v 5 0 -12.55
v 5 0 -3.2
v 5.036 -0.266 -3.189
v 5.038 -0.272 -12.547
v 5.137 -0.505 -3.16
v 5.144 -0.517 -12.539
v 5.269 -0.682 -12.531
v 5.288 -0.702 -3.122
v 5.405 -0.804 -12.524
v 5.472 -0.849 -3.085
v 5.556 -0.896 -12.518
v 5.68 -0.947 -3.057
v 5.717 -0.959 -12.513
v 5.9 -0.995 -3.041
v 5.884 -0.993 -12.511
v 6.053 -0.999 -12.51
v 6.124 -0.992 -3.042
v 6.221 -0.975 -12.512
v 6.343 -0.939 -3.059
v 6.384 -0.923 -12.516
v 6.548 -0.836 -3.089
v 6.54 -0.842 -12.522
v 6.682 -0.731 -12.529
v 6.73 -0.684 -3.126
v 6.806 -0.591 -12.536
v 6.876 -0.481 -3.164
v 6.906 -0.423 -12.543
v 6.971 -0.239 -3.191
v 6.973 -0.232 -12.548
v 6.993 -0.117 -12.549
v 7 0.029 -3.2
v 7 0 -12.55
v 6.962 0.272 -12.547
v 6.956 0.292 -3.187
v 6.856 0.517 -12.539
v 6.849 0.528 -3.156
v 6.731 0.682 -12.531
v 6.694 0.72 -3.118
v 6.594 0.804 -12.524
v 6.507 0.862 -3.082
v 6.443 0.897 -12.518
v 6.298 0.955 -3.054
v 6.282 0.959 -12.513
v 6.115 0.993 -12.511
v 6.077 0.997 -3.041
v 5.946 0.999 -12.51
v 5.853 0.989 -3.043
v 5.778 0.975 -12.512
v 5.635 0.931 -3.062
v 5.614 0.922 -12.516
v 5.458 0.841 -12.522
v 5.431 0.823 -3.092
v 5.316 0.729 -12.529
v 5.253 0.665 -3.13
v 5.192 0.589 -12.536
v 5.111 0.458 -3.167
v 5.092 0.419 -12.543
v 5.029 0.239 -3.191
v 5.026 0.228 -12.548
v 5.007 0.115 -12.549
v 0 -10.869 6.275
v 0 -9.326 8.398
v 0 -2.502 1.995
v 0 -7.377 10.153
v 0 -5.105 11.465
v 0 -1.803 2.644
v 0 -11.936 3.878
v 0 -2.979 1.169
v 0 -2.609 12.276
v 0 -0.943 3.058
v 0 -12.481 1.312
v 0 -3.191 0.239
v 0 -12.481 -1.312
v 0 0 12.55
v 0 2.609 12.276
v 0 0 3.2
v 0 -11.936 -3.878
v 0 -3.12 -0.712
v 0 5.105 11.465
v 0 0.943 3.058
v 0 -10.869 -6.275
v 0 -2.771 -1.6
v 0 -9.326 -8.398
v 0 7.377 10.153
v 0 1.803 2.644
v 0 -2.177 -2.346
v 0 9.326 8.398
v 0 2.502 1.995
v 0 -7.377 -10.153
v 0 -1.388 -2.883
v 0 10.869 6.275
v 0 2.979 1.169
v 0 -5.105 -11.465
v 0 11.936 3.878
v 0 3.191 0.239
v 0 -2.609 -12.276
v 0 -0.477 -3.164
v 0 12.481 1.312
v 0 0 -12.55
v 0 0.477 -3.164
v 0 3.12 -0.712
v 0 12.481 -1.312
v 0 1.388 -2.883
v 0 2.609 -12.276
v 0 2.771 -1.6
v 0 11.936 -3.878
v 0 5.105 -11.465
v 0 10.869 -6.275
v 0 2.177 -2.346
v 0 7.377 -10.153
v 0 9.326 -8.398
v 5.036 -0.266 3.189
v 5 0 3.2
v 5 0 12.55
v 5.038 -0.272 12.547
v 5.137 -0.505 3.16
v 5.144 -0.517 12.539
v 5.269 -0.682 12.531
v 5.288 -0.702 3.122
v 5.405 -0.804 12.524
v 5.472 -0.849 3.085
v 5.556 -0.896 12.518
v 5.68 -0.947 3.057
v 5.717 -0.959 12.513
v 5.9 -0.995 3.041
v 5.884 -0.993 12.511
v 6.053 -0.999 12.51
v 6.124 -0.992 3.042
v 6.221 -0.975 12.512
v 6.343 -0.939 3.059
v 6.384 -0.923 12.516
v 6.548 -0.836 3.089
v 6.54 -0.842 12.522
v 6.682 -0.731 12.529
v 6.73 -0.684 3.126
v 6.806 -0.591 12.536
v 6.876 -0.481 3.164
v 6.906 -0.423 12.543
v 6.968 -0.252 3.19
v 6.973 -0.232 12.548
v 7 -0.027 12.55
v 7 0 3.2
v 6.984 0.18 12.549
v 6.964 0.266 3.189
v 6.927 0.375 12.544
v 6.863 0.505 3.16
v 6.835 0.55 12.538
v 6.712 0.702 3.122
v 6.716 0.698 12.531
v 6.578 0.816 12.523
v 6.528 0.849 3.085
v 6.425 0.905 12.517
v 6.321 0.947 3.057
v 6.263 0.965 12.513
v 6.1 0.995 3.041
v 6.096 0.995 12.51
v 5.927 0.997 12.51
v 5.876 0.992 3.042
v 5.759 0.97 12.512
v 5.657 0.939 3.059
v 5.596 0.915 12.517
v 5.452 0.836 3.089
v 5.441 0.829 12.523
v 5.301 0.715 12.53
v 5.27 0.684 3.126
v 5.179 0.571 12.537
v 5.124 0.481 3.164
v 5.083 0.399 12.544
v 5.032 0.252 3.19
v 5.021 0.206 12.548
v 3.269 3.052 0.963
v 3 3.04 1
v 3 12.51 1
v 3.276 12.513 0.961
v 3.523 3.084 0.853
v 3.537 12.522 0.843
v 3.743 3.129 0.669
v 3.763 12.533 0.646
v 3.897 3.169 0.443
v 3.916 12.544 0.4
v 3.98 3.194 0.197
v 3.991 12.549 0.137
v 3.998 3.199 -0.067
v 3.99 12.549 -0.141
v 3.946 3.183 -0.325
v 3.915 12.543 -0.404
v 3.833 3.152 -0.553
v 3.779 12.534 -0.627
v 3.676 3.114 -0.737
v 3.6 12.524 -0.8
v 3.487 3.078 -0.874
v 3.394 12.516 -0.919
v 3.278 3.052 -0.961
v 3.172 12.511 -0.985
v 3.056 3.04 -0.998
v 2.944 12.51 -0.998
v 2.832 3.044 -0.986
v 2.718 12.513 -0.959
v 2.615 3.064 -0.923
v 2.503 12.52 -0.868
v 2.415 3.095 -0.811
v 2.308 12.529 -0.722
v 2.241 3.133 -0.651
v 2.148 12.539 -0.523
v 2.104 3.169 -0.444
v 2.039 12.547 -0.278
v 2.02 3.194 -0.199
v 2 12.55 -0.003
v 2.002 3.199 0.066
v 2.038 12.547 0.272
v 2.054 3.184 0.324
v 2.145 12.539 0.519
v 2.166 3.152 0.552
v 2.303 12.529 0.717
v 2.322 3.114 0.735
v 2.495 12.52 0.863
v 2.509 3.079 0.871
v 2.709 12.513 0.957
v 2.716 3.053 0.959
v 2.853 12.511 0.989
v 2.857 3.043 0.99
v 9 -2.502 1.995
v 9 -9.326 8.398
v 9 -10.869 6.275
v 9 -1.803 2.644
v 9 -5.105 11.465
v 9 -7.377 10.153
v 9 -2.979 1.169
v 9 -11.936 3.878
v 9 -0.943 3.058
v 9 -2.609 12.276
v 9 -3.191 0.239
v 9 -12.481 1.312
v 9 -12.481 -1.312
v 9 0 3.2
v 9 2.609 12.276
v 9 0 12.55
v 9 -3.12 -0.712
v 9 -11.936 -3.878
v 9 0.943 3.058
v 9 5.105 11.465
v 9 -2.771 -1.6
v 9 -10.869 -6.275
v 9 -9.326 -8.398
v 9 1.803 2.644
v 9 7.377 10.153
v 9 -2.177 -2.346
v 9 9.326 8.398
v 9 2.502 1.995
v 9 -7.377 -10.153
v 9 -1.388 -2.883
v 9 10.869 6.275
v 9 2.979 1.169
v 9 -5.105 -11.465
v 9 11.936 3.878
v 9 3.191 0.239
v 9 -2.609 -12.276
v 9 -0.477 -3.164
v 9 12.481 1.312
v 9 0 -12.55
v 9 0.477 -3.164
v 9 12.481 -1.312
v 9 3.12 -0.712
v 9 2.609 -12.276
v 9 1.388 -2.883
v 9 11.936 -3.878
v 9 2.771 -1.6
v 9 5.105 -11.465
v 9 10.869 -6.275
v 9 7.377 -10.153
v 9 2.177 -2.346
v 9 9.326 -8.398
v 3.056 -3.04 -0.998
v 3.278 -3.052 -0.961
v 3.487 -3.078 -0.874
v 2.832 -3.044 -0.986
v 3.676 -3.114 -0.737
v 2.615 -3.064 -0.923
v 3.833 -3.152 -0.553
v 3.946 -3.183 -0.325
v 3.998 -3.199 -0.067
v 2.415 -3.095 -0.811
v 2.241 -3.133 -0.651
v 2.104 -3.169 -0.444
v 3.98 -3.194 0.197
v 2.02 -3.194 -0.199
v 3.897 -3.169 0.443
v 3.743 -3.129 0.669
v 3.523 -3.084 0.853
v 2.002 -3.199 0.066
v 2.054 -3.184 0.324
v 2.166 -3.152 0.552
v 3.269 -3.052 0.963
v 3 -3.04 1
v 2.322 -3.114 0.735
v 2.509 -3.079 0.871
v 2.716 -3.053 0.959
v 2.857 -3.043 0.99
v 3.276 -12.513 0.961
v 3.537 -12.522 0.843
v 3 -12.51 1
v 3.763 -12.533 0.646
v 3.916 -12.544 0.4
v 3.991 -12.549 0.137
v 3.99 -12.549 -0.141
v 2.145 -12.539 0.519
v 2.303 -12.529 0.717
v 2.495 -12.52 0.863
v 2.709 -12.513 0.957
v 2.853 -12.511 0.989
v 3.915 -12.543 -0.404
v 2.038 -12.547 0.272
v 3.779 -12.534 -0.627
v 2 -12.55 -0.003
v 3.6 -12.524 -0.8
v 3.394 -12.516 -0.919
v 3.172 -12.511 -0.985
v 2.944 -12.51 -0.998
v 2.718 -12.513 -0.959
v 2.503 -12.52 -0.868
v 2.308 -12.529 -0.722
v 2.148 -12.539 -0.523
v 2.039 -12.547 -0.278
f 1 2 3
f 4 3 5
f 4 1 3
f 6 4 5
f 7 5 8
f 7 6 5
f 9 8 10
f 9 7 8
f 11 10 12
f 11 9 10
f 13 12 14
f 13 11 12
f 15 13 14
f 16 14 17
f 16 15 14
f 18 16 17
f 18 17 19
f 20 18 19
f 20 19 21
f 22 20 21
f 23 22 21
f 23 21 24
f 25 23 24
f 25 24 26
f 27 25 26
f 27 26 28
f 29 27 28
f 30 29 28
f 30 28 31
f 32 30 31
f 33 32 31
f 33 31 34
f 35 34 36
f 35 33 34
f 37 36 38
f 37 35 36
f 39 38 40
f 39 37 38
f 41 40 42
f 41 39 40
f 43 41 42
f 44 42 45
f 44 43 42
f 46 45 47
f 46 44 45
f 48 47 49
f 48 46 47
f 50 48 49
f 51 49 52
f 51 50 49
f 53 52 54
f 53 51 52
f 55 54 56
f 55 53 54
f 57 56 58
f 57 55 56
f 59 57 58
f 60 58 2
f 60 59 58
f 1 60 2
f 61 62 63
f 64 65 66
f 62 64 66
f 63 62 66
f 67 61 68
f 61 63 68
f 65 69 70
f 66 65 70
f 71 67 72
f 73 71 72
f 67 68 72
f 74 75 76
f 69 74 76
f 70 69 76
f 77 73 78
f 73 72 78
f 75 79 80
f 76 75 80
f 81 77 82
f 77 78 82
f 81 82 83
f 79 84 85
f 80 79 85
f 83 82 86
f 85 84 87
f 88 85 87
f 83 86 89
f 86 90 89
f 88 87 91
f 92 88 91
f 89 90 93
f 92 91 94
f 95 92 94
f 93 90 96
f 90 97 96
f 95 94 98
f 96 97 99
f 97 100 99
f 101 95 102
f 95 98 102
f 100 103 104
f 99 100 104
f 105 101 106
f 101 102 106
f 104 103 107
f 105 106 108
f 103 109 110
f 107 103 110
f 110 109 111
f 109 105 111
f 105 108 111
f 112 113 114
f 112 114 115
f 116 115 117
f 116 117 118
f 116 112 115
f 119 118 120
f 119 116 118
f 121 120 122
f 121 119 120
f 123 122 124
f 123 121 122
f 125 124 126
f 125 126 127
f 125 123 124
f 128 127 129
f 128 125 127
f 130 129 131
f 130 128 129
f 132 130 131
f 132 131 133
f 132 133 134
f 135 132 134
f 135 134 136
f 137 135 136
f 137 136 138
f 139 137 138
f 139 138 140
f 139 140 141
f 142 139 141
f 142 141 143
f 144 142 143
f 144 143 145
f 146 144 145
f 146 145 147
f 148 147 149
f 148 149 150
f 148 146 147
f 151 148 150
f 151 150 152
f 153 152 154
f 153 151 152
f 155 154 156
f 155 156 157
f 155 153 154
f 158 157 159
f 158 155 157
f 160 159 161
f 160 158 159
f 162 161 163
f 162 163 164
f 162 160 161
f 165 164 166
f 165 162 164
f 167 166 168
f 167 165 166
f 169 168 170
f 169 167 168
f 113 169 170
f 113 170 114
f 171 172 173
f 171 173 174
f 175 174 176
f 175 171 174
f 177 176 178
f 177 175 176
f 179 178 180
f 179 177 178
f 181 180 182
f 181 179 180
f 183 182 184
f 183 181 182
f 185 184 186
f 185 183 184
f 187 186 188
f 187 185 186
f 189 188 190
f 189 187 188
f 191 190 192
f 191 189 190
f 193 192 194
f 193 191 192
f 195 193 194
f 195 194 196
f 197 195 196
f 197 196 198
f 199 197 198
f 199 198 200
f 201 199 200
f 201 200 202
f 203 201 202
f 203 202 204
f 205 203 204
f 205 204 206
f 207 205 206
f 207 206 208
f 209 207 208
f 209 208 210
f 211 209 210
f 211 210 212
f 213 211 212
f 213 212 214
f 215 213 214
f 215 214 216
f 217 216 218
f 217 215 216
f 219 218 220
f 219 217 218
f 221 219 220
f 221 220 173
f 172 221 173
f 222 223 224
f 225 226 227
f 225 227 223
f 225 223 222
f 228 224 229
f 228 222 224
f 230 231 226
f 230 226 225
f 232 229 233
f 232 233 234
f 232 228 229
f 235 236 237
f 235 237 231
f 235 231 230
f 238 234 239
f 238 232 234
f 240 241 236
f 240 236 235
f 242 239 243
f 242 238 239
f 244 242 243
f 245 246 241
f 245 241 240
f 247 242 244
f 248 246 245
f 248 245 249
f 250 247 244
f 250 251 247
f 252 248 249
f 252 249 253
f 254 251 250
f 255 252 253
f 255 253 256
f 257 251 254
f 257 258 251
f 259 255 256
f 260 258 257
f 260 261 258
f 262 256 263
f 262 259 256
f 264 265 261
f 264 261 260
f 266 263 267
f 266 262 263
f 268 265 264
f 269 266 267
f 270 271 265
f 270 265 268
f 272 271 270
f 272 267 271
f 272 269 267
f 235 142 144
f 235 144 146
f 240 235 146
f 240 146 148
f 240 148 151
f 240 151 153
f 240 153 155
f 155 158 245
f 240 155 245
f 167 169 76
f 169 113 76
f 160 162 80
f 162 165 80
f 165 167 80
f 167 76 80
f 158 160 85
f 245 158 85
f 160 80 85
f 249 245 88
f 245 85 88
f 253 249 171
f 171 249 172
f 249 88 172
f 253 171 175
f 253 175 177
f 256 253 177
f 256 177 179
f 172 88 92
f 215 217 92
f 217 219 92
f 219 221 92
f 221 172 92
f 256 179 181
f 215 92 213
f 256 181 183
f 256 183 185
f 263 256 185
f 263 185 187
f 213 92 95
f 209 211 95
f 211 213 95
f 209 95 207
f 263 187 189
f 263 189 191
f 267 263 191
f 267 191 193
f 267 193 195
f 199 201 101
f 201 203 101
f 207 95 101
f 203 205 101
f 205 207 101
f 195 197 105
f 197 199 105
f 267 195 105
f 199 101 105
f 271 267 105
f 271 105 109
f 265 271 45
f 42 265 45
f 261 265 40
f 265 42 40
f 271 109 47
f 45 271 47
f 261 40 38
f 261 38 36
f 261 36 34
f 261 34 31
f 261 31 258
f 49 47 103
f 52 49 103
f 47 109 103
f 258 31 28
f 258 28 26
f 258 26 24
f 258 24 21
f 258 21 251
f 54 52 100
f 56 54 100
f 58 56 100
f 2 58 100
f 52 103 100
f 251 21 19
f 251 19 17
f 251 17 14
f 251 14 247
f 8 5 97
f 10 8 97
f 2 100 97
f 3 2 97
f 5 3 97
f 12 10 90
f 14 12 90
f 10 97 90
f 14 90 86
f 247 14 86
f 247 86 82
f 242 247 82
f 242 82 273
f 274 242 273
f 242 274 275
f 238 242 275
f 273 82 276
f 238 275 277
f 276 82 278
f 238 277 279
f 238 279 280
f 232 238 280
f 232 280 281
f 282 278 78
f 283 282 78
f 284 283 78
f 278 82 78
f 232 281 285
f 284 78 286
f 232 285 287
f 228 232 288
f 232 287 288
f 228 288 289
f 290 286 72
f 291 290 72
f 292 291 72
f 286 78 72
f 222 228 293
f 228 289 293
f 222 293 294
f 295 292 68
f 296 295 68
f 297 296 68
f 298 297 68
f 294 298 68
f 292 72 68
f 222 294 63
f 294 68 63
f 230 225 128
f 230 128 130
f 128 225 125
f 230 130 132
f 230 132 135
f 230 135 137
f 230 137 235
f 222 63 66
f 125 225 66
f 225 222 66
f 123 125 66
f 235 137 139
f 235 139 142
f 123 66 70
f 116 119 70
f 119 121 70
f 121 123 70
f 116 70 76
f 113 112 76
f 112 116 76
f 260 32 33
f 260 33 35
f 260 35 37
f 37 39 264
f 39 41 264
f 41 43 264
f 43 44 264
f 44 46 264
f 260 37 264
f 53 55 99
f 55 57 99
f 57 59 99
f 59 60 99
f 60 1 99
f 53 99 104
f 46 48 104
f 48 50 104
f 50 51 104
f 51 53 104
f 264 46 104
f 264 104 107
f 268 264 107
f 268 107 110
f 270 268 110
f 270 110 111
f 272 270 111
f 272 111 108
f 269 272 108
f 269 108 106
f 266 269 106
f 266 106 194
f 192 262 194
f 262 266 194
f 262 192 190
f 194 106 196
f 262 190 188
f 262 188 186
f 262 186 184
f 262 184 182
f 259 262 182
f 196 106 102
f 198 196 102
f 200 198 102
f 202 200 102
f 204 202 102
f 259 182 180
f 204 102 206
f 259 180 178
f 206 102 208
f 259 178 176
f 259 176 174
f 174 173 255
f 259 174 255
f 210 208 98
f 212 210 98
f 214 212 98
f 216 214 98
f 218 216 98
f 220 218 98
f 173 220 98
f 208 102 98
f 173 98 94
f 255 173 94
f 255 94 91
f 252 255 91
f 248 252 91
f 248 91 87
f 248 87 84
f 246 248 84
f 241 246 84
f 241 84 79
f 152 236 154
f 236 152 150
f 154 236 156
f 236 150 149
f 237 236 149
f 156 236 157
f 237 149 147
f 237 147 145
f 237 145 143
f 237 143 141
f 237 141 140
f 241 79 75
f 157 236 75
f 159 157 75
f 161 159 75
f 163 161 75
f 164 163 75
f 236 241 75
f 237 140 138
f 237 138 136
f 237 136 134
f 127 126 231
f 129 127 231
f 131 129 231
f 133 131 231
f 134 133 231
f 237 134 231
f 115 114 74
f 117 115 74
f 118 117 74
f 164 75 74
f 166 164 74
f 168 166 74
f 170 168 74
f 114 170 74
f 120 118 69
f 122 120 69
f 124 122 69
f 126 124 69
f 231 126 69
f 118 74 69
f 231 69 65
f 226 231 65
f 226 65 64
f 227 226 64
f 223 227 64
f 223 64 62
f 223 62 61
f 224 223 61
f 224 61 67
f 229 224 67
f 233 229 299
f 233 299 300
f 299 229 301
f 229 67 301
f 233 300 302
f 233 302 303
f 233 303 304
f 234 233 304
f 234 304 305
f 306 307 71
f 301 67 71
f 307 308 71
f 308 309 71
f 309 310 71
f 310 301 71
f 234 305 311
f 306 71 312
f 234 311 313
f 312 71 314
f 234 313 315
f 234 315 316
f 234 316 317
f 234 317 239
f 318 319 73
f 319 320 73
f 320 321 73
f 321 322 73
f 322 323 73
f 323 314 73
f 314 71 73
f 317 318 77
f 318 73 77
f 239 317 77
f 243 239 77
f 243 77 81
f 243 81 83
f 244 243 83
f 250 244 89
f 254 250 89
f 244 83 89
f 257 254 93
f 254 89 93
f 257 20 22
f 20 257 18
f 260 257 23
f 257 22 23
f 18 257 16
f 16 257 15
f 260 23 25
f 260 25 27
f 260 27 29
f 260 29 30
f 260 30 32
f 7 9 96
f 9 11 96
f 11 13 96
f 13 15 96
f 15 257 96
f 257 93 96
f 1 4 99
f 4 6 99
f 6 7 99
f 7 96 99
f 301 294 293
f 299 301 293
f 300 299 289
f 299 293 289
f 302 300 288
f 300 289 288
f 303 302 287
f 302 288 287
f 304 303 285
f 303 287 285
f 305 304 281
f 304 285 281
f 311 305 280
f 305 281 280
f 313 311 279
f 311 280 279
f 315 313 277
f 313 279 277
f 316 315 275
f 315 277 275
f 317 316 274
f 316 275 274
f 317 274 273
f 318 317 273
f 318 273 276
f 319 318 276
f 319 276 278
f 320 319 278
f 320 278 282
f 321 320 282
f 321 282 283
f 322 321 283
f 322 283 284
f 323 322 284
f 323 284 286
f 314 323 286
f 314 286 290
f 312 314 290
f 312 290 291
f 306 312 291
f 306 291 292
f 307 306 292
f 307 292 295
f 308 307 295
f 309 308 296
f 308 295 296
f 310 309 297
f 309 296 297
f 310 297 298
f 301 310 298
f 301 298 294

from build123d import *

# Parameters (mm, degrees)
SKETCH_1_R                      = 12.55
EXTRUDE_1_DEPTH                 = 9
CUT_EXTRUDE_1_REACH             = 21.9
SKETCH_2_R                      = 3.2
CUT_EXTRUDE_2_REACH             = 21.9
SKETCH_3_R                      = 1
CUT_EXTRUDE_2_DIRECTION_2_REACH = 21.9
CUT_EXTRUDE_3_DEPTH             = 21
CUT_EXTRUDE_3_DEPTH_BACK        = 19
SKETCH_4_R                      = 1


with BuildPart() as part:
    # 草图1 → 凸台-拉伸1 (new body)
    with BuildSketch(Plane(origin=(0, 0, 0), x_dir=(0, 0, -1), z_dir=(1, 0, 0))):
        Circle(SKETCH_1_R)
    extrude(amount=EXTRUDE_1_DEPTH)

    # 草图2 → 切除-拉伸1 (cut, up to next)
    with BuildSketch(Plane.ZY, mode=Mode.PRIVATE) as cut_extrude_1_sk1:
        Circle(SKETCH_2_R)
    cut_extrude_1_tool1 = extrude(cut_extrude_1_sk1.sketch, amount=-CUT_EXTRUDE_1_REACH, mode=Mode.PRIVATE) & part.part
    add(cut_extrude_1_tool1.solids().sort_by_distance((0, 0, 0))[0], mode=Mode.SUBTRACT)

    # 草图3 → 切除-拉伸2 (cut, up to next)
    with BuildSketch(Plane(origin=(0, 0, 0), x_dir=(1, 0, 0), z_dir=(0, 1, 0)), mode=Mode.PRIVATE) as cut_extrude_2_sk1:
        with Locations(Location((3, 0, 0), (0, 0, 270))):
            Circle(SKETCH_3_R)
    cut_extrude_2_tool1 = extrude(cut_extrude_2_sk1.sketch, amount=-CUT_EXTRUDE_2_REACH, mode=Mode.PRIVATE) & part.part
    add(cut_extrude_2_tool1.solids().sort_by_distance((3, 0, 0))[0], mode=Mode.SUBTRACT)

    # 草图3 → 切除-拉伸2 direction 2 (cut, up to next)
    with BuildSketch(Plane(origin=(0, 0, 0), x_dir=(1, 0, 0), z_dir=(0, 1, 0)), mode=Mode.PRIVATE) as cut_extrude_2_direction_2_sk1:
        with Locations(Location((3, 0, 0), (0, 0, 270))):
            Circle(SKETCH_3_R)
    cut_extrude_2_direction_2_tool1 = extrude(cut_extrude_2_direction_2_sk1.sketch, amount=CUT_EXTRUDE_2_DIRECTION_2_REACH, mode=Mode.PRIVATE) & part.part
    add(cut_extrude_2_direction_2_tool1.solids().sort_by_distance((3, 0, 0))[0], mode=Mode.SUBTRACT)

    # 草图4 → 切除-拉伸3 (cut, two sides: drawn at the far end of the back side and taken through both)
    with BuildSketch(Plane.XY.offset(-CUT_EXTRUDE_3_DEPTH_BACK)):
        with Locations(Location((6, 0, 0), (0, 0, 180))):
            Circle(SKETCH_4_R)
    extrude(amount=CUT_EXTRUDE_3_DEPTH + CUT_EXTRUDE_3_DEPTH_BACK, mode=Mode.SUBTRACT)


solid = part.part
